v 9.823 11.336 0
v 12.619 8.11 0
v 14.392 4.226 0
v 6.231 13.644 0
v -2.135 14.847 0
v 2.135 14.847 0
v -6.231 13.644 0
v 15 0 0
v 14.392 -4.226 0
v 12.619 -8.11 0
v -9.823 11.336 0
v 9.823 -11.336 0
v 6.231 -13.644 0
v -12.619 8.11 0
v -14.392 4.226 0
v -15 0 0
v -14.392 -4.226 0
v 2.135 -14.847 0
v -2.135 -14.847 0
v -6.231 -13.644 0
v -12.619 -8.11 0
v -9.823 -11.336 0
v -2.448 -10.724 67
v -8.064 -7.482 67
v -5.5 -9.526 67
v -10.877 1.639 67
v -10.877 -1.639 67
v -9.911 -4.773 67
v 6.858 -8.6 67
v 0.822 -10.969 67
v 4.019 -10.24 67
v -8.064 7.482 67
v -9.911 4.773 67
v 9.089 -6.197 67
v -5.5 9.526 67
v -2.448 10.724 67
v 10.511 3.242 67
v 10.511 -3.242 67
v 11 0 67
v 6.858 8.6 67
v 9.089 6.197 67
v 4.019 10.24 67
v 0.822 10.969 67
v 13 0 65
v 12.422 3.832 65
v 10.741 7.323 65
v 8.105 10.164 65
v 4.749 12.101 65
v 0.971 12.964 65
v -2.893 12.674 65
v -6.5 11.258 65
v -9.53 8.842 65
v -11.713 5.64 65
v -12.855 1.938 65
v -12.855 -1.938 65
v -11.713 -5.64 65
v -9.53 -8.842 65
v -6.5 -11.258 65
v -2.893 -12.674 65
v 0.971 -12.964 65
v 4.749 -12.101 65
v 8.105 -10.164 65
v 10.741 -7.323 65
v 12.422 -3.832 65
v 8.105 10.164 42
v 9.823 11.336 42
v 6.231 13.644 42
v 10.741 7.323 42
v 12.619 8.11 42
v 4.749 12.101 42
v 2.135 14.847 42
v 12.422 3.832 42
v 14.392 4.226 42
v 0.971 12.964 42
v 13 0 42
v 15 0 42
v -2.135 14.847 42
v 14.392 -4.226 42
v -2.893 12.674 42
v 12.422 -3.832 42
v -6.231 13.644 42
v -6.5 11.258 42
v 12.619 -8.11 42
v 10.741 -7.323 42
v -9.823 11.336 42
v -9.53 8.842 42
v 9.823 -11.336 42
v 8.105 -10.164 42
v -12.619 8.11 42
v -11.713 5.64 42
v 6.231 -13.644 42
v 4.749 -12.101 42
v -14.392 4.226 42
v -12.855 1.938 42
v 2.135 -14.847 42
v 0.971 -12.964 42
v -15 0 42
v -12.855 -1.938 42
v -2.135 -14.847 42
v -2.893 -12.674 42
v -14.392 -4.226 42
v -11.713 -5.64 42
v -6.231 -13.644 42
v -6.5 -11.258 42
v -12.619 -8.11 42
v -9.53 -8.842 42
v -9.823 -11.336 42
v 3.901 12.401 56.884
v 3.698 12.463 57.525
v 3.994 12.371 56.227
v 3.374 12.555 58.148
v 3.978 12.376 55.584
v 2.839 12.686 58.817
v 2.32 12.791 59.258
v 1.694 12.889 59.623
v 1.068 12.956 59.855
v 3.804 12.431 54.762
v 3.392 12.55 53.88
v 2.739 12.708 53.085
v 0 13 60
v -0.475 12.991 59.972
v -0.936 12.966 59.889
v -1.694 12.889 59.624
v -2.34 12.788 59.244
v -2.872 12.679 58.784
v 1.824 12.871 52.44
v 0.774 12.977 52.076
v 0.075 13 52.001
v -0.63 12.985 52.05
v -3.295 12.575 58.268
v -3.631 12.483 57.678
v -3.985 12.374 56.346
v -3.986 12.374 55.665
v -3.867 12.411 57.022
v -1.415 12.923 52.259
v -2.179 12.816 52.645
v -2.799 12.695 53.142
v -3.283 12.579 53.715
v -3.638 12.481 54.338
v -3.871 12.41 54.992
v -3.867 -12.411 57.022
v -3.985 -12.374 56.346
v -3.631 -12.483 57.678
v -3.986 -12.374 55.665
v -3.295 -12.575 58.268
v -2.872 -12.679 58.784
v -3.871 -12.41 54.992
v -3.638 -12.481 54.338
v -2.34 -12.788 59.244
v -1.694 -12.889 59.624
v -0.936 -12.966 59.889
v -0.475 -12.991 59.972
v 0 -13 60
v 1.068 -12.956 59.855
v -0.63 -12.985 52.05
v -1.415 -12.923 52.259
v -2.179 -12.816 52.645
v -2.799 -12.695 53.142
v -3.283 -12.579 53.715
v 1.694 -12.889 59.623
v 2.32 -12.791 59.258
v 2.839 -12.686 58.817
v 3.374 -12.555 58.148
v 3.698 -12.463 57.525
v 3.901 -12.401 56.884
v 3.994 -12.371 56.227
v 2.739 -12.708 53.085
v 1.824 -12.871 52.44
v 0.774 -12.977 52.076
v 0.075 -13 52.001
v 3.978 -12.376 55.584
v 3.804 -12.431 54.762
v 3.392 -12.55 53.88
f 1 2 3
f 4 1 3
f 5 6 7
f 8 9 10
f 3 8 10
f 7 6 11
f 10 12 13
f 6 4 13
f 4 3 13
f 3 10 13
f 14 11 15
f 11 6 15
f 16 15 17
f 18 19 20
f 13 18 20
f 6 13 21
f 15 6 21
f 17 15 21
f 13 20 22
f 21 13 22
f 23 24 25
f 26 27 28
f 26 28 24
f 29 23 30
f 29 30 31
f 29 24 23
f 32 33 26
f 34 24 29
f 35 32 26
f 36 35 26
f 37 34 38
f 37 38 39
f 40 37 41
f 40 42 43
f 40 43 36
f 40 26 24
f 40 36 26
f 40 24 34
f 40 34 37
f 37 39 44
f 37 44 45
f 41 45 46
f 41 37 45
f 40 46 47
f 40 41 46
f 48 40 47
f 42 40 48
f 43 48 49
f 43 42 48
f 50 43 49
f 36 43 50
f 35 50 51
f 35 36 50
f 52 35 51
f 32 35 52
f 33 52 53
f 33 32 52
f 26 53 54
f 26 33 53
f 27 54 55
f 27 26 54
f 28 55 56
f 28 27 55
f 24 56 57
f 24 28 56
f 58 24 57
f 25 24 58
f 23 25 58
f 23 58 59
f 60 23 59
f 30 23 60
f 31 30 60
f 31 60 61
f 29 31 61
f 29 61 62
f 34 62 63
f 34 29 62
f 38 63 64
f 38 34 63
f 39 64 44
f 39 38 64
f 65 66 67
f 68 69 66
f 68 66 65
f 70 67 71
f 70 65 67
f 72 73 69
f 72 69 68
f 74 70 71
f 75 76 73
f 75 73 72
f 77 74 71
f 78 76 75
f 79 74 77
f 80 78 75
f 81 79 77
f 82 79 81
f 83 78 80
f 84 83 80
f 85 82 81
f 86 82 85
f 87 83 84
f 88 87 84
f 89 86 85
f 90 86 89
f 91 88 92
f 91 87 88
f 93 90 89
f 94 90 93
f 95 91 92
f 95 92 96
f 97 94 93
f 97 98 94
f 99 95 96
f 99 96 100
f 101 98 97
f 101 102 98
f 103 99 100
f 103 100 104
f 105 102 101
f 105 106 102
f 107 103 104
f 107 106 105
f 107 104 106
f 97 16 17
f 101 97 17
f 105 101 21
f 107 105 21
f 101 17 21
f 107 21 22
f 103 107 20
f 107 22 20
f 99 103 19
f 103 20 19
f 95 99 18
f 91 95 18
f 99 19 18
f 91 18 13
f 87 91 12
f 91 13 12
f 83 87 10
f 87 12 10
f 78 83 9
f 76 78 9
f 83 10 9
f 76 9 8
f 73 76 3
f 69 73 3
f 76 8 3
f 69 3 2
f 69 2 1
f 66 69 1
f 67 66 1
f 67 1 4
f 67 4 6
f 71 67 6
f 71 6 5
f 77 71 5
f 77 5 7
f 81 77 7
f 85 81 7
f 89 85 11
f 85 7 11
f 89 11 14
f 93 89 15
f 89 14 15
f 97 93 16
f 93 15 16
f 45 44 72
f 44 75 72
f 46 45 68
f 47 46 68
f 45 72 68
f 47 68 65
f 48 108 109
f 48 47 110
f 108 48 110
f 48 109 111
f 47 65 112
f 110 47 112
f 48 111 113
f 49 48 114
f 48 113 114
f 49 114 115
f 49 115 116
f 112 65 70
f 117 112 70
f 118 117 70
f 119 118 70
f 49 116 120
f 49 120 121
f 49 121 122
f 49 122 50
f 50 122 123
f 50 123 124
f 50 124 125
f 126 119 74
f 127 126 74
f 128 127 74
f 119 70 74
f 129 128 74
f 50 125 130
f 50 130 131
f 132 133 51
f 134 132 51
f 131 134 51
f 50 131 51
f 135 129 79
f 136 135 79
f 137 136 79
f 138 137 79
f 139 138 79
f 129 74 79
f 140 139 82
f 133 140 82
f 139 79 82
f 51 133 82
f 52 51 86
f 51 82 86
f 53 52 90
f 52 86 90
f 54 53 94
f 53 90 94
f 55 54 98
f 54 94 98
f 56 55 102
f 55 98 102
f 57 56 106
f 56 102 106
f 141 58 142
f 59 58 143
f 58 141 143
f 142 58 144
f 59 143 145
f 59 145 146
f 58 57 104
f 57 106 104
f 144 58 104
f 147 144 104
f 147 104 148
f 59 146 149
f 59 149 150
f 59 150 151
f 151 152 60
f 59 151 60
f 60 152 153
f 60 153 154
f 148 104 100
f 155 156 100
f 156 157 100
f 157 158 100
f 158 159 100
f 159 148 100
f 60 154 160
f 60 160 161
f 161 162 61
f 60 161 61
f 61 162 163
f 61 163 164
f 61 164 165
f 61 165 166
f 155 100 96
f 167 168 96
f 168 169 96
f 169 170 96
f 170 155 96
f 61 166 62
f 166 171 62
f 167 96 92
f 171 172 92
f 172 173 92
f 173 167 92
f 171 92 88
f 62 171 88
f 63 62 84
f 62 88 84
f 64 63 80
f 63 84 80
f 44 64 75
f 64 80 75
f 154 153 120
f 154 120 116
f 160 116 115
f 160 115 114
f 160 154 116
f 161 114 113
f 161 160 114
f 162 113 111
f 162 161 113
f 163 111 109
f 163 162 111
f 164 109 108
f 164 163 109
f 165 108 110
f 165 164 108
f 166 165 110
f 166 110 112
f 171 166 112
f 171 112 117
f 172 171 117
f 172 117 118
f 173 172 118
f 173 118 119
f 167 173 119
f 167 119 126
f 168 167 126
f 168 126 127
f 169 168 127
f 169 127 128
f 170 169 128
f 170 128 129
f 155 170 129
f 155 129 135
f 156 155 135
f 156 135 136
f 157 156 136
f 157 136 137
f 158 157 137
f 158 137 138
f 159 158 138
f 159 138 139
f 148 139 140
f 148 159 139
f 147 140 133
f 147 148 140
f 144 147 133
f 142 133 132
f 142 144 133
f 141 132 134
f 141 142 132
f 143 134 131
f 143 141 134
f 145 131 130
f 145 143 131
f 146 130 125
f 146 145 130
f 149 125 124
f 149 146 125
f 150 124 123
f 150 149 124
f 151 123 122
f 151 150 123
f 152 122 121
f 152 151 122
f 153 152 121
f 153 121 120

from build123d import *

# Parameters (mm, degrees)
SCHIZZO1_R             = 15
ESTRUSIONE1_DEPTH      = 42
SCHIZZO2_R             = 13
ESTRUSIONE2_DEPTH      = 25
SMUSSO1_SIZE           = 2
ESTRUSIONE3_DEPTH      = 71.278019323
ESTRUSIONE3_DEPTH_BACK = 71.278019323
SCHIZZO3_R             = 4


with BuildPart() as part:
    # Schizzo1 → Estrusione1 (new body)
    with BuildSketch(Plane.XY):
        with Locations(Location((0, 0, 0), (0, 0, 180))):
            Circle(SCHIZZO1_R)
    extrude(amount=ESTRUSIONE1_DEPTH)

    # Schizzo2 → Estrusione2 (add)
    with BuildSketch(Plane.XY.offset(42)):
        Circle(SCHIZZO2_R)
    extrude(amount=ESTRUSIONE2_DEPTH)

    # Smusso1
    smusso1_edges = [part.edges().sort_by_distance(p)[0] for p in [
        (-13, 0, 67),
    ]]
    chamfer(smusso1_edges, length=SMUSSO1_SIZE)

    # Schizzo3 → Estrusione3 (cut, two sides: drawn at the far end of the back side and taken through both)
    with BuildSketch(Plane(origin=(0, 0, 0), x_dir=(1, 0, 0), z_dir=(0, 1, 0)).offset(-ESTRUSIONE3_DEPTH_BACK)):
        with Locations(Location((0, -56, 0), (0, 0, 270))):
            Circle(SCHIZZO3_R)
    extrude(amount=ESTRUSIONE3_DEPTH + ESTRUSIONE3_DEPTH_BACK, mode=Mode.SUBTRACT)


solid = part.part
